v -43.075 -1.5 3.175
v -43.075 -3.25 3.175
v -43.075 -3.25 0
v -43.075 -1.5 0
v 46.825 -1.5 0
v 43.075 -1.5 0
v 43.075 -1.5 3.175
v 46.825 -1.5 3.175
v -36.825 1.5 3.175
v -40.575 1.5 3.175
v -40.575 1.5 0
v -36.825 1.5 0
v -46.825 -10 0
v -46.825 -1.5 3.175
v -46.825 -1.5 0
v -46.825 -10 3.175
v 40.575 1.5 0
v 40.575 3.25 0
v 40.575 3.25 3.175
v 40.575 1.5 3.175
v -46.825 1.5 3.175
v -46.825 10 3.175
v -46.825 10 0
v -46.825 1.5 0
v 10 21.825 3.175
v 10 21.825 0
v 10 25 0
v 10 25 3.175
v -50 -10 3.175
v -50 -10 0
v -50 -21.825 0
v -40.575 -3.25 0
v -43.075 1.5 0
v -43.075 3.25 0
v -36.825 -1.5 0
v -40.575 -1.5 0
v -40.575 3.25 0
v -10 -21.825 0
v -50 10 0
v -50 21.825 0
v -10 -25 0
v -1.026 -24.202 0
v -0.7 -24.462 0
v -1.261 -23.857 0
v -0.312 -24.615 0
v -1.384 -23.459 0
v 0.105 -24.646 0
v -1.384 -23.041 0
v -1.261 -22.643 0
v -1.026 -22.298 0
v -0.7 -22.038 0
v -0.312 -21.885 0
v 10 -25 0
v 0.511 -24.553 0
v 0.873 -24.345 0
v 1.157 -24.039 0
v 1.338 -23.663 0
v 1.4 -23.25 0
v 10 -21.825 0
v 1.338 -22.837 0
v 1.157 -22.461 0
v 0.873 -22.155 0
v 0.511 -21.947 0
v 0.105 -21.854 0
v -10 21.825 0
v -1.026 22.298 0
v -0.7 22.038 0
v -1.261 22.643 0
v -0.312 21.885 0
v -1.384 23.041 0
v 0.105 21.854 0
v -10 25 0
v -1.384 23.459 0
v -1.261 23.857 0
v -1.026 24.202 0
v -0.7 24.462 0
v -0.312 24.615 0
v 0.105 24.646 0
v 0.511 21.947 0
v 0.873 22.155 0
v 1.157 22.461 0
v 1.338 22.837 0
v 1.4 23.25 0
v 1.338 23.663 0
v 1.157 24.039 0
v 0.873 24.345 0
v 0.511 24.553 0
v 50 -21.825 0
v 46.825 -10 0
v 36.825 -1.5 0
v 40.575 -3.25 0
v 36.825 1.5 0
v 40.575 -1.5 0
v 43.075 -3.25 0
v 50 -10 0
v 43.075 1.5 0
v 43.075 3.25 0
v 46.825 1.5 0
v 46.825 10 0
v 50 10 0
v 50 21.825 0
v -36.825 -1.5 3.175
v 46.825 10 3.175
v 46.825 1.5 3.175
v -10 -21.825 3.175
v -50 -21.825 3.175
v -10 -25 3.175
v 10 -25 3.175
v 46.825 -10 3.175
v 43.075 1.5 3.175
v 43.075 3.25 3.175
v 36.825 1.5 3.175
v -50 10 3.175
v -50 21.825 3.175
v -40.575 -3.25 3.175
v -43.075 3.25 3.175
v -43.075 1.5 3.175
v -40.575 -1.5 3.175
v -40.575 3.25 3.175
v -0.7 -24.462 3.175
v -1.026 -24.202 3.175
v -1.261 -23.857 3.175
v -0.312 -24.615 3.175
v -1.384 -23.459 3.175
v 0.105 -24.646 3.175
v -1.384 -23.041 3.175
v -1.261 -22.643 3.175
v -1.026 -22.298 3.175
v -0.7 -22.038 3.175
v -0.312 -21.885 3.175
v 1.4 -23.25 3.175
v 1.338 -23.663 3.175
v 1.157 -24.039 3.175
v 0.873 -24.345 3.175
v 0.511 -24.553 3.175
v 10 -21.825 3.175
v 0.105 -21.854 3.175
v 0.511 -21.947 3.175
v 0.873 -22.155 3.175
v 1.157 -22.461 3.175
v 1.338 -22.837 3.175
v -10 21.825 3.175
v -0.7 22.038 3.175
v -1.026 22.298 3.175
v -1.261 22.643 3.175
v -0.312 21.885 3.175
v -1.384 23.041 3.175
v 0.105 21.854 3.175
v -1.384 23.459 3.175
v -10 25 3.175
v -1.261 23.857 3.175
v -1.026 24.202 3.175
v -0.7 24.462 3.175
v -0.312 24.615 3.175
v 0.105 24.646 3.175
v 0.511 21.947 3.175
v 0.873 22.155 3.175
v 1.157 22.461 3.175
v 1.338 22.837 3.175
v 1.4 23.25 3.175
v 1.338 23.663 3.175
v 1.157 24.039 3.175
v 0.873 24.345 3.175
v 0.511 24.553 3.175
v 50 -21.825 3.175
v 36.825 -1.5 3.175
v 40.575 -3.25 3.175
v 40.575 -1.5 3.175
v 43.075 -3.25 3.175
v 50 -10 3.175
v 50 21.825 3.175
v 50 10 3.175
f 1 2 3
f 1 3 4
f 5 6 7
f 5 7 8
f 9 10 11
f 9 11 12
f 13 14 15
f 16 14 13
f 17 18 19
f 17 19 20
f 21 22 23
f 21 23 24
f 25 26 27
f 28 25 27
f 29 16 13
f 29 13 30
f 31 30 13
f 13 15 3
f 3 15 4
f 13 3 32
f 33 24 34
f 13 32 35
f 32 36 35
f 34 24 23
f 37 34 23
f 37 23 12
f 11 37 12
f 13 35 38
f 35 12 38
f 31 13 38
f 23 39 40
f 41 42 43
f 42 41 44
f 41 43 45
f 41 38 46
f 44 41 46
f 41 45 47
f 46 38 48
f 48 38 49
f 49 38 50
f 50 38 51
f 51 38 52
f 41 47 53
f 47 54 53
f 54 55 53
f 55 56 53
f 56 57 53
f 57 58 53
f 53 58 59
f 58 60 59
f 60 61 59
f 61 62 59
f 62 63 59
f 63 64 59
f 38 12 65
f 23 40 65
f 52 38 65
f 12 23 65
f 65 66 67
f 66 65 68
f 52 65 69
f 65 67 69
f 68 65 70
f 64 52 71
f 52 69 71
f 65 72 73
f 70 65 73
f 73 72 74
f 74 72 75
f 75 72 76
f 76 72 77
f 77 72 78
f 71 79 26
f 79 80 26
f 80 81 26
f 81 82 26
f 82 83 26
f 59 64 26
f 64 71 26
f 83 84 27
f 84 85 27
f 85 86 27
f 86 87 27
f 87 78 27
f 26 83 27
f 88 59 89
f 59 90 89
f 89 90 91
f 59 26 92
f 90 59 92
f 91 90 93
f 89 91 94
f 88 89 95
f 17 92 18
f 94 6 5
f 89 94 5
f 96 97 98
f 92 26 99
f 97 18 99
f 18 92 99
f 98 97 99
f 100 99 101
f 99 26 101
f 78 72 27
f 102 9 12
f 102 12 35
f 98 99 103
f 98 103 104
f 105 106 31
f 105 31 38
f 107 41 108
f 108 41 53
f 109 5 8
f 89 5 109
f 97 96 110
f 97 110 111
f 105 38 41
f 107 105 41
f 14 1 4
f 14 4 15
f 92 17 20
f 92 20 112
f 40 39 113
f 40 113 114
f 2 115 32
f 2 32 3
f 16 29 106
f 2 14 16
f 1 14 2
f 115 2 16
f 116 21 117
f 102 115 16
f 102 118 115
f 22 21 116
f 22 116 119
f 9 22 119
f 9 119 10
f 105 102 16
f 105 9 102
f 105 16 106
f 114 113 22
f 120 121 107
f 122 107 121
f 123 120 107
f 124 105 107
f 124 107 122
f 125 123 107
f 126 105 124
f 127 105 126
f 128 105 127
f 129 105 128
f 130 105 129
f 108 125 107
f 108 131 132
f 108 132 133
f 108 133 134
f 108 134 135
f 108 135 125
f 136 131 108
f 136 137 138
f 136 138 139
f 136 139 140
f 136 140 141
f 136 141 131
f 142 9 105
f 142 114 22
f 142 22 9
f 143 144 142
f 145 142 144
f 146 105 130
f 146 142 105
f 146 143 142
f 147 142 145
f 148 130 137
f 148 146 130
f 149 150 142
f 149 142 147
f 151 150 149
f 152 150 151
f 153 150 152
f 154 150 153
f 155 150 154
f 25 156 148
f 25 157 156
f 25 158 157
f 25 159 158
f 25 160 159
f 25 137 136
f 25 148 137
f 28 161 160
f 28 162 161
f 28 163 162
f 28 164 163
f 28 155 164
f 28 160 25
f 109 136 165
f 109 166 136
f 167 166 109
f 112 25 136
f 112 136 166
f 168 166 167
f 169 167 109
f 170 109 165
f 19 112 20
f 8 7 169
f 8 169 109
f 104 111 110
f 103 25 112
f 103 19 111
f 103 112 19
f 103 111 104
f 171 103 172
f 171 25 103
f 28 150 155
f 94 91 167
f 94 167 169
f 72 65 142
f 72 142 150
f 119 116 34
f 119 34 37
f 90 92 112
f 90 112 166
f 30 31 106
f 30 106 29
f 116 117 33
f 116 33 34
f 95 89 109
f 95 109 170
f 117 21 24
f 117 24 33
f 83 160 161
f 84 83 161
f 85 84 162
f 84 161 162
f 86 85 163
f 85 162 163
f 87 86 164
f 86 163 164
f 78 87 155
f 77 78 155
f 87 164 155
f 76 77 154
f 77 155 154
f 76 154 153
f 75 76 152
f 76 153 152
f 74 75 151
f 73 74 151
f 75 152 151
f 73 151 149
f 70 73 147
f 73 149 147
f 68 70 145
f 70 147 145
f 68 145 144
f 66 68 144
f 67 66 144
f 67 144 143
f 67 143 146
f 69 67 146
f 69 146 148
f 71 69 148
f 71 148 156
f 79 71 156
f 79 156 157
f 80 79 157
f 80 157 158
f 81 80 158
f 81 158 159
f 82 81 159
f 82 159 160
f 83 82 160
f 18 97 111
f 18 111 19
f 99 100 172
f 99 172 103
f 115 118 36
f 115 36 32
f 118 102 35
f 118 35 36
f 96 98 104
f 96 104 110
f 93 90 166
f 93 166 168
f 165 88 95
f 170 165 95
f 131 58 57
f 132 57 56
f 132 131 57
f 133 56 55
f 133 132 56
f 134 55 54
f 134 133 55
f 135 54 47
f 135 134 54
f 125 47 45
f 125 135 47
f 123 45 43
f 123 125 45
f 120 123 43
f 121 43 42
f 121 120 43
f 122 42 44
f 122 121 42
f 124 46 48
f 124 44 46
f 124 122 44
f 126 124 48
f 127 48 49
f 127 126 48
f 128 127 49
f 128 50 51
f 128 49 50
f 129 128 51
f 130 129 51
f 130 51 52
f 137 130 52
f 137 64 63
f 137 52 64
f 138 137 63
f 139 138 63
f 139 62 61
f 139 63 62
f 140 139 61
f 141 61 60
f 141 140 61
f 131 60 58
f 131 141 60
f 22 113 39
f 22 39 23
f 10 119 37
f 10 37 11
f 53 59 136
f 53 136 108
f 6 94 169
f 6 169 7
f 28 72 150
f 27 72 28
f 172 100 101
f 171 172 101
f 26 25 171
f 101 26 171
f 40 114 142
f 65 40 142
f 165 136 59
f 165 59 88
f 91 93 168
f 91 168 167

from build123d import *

# Parameters (mm, degrees)
SKETCH1_W           = 100
SKETCH1_H           = 50
BOSS_EXTRUDE1_DEPTH = 3.175
SKETCH5_R           = 1.4
SKETCH5_W           = 40
SKETCH5_H           = 3.175
CUT_EXTRUDE1_DEPTH  = 4.175
T_CUT_DEPTH         = 4.175
T_CUT2_DEPTH        = 4.175


with BuildPart() as part:
    # Sketch1 → Boss-Extrude1 (new body)
    with BuildSketch(Plane.XY):
        Rectangle(SKETCH1_W, SKETCH1_H)
    extrude(amount=BOSS_EXTRUDE1_DEPTH)

    # Sketch5 → Cut-Extrude1 (cut, through all)
    with BuildSketch(Plane(origin=(-7.388521522, -2.556187212, 3.175), x_dir=(1, 0, 0), z_dir=(0, 0, 1))):
        with Locations((7.388521522, 25.806187212)):
            Circle(SKETCH5_R)
        with Locations((-22.611478478, 25.968687212)):
            Rectangle(SKETCH5_W, SKETCH5_H)
        with Locations((37.388521522, 25.968687212)):
            Rectangle(SKETCH5_W, SKETCH5_H)
    cut_extrude1 = extrude(amount=-CUT_EXTRUDE1_DEPTH, mode=Mode.SUBTRACT)

    # Mirror1: Cut-Extrude1 across plane
    add(cut_extrude1.mirror(Plane.ZX), mode=Mode.SUBTRACT)

    # Sketch3 → T Cut (cut, through all)
    with BuildSketch(Plane(origin=(2.435372351, -11.560763397, 0), x_dir=(-1, 0, 0), z_dir=(0, 0, -1))):
        Polygon((-47.564627649, 1.560763397), (-47.564627649, 21.560763397), (-44.389627649, 21.560763397), (-44.389627649, 13.060763397), (-40.639627649, 13.060763397), (-40.639627649, 14.810763397), (-38.139627649, 14.810763397), (-38.139627649, 13.060763397), (-34.389627649, 13.060763397), (-34.389627649, 10.060763397), (-38.139627649, 10.060763397), (-38.139627649, 8.310763397), (-40.639627649, 8.310763397), (-40.639627649, 10.060763397), (-44.389627649, 10.060763397), (-44.389627649, 1.560763397), align=None)
    extrude(amount=-T_CUT_DEPTH, mode=Mode.SUBTRACT)

    # Sketch32 → T Cut2 (cut, through all)
    with BuildSketch(Plane(origin=(-11.542281755, -7.322180687, 3.175), x_dir=(1, 0, 0), z_dir=(0, 0, 1))):
        Polygon((-38.457718245, -2.677819313), (-38.457718245, 17.322180687), (-35.282718245, 17.322180687), (-35.282718245, 8.822180687), (-31.532718245, 8.822180687), (-31.532718245, 10.572180687), (-29.032718245, 10.572180687), (-29.032718245, 8.822180687), (-25.282718245, 8.822180687), (-25.282718245, 5.822180687), (-29.032718245, 5.822180687), (-29.032718245, 4.072180687), (-31.532718245, 4.072180687), (-31.532718245, 5.822180687), (-35.282718245, 5.822180687), (-35.282718245, -2.677819313), align=None)
    extrude(amount=-T_CUT2_DEPTH, mode=Mode.SUBTRACT)


solid = part.part
